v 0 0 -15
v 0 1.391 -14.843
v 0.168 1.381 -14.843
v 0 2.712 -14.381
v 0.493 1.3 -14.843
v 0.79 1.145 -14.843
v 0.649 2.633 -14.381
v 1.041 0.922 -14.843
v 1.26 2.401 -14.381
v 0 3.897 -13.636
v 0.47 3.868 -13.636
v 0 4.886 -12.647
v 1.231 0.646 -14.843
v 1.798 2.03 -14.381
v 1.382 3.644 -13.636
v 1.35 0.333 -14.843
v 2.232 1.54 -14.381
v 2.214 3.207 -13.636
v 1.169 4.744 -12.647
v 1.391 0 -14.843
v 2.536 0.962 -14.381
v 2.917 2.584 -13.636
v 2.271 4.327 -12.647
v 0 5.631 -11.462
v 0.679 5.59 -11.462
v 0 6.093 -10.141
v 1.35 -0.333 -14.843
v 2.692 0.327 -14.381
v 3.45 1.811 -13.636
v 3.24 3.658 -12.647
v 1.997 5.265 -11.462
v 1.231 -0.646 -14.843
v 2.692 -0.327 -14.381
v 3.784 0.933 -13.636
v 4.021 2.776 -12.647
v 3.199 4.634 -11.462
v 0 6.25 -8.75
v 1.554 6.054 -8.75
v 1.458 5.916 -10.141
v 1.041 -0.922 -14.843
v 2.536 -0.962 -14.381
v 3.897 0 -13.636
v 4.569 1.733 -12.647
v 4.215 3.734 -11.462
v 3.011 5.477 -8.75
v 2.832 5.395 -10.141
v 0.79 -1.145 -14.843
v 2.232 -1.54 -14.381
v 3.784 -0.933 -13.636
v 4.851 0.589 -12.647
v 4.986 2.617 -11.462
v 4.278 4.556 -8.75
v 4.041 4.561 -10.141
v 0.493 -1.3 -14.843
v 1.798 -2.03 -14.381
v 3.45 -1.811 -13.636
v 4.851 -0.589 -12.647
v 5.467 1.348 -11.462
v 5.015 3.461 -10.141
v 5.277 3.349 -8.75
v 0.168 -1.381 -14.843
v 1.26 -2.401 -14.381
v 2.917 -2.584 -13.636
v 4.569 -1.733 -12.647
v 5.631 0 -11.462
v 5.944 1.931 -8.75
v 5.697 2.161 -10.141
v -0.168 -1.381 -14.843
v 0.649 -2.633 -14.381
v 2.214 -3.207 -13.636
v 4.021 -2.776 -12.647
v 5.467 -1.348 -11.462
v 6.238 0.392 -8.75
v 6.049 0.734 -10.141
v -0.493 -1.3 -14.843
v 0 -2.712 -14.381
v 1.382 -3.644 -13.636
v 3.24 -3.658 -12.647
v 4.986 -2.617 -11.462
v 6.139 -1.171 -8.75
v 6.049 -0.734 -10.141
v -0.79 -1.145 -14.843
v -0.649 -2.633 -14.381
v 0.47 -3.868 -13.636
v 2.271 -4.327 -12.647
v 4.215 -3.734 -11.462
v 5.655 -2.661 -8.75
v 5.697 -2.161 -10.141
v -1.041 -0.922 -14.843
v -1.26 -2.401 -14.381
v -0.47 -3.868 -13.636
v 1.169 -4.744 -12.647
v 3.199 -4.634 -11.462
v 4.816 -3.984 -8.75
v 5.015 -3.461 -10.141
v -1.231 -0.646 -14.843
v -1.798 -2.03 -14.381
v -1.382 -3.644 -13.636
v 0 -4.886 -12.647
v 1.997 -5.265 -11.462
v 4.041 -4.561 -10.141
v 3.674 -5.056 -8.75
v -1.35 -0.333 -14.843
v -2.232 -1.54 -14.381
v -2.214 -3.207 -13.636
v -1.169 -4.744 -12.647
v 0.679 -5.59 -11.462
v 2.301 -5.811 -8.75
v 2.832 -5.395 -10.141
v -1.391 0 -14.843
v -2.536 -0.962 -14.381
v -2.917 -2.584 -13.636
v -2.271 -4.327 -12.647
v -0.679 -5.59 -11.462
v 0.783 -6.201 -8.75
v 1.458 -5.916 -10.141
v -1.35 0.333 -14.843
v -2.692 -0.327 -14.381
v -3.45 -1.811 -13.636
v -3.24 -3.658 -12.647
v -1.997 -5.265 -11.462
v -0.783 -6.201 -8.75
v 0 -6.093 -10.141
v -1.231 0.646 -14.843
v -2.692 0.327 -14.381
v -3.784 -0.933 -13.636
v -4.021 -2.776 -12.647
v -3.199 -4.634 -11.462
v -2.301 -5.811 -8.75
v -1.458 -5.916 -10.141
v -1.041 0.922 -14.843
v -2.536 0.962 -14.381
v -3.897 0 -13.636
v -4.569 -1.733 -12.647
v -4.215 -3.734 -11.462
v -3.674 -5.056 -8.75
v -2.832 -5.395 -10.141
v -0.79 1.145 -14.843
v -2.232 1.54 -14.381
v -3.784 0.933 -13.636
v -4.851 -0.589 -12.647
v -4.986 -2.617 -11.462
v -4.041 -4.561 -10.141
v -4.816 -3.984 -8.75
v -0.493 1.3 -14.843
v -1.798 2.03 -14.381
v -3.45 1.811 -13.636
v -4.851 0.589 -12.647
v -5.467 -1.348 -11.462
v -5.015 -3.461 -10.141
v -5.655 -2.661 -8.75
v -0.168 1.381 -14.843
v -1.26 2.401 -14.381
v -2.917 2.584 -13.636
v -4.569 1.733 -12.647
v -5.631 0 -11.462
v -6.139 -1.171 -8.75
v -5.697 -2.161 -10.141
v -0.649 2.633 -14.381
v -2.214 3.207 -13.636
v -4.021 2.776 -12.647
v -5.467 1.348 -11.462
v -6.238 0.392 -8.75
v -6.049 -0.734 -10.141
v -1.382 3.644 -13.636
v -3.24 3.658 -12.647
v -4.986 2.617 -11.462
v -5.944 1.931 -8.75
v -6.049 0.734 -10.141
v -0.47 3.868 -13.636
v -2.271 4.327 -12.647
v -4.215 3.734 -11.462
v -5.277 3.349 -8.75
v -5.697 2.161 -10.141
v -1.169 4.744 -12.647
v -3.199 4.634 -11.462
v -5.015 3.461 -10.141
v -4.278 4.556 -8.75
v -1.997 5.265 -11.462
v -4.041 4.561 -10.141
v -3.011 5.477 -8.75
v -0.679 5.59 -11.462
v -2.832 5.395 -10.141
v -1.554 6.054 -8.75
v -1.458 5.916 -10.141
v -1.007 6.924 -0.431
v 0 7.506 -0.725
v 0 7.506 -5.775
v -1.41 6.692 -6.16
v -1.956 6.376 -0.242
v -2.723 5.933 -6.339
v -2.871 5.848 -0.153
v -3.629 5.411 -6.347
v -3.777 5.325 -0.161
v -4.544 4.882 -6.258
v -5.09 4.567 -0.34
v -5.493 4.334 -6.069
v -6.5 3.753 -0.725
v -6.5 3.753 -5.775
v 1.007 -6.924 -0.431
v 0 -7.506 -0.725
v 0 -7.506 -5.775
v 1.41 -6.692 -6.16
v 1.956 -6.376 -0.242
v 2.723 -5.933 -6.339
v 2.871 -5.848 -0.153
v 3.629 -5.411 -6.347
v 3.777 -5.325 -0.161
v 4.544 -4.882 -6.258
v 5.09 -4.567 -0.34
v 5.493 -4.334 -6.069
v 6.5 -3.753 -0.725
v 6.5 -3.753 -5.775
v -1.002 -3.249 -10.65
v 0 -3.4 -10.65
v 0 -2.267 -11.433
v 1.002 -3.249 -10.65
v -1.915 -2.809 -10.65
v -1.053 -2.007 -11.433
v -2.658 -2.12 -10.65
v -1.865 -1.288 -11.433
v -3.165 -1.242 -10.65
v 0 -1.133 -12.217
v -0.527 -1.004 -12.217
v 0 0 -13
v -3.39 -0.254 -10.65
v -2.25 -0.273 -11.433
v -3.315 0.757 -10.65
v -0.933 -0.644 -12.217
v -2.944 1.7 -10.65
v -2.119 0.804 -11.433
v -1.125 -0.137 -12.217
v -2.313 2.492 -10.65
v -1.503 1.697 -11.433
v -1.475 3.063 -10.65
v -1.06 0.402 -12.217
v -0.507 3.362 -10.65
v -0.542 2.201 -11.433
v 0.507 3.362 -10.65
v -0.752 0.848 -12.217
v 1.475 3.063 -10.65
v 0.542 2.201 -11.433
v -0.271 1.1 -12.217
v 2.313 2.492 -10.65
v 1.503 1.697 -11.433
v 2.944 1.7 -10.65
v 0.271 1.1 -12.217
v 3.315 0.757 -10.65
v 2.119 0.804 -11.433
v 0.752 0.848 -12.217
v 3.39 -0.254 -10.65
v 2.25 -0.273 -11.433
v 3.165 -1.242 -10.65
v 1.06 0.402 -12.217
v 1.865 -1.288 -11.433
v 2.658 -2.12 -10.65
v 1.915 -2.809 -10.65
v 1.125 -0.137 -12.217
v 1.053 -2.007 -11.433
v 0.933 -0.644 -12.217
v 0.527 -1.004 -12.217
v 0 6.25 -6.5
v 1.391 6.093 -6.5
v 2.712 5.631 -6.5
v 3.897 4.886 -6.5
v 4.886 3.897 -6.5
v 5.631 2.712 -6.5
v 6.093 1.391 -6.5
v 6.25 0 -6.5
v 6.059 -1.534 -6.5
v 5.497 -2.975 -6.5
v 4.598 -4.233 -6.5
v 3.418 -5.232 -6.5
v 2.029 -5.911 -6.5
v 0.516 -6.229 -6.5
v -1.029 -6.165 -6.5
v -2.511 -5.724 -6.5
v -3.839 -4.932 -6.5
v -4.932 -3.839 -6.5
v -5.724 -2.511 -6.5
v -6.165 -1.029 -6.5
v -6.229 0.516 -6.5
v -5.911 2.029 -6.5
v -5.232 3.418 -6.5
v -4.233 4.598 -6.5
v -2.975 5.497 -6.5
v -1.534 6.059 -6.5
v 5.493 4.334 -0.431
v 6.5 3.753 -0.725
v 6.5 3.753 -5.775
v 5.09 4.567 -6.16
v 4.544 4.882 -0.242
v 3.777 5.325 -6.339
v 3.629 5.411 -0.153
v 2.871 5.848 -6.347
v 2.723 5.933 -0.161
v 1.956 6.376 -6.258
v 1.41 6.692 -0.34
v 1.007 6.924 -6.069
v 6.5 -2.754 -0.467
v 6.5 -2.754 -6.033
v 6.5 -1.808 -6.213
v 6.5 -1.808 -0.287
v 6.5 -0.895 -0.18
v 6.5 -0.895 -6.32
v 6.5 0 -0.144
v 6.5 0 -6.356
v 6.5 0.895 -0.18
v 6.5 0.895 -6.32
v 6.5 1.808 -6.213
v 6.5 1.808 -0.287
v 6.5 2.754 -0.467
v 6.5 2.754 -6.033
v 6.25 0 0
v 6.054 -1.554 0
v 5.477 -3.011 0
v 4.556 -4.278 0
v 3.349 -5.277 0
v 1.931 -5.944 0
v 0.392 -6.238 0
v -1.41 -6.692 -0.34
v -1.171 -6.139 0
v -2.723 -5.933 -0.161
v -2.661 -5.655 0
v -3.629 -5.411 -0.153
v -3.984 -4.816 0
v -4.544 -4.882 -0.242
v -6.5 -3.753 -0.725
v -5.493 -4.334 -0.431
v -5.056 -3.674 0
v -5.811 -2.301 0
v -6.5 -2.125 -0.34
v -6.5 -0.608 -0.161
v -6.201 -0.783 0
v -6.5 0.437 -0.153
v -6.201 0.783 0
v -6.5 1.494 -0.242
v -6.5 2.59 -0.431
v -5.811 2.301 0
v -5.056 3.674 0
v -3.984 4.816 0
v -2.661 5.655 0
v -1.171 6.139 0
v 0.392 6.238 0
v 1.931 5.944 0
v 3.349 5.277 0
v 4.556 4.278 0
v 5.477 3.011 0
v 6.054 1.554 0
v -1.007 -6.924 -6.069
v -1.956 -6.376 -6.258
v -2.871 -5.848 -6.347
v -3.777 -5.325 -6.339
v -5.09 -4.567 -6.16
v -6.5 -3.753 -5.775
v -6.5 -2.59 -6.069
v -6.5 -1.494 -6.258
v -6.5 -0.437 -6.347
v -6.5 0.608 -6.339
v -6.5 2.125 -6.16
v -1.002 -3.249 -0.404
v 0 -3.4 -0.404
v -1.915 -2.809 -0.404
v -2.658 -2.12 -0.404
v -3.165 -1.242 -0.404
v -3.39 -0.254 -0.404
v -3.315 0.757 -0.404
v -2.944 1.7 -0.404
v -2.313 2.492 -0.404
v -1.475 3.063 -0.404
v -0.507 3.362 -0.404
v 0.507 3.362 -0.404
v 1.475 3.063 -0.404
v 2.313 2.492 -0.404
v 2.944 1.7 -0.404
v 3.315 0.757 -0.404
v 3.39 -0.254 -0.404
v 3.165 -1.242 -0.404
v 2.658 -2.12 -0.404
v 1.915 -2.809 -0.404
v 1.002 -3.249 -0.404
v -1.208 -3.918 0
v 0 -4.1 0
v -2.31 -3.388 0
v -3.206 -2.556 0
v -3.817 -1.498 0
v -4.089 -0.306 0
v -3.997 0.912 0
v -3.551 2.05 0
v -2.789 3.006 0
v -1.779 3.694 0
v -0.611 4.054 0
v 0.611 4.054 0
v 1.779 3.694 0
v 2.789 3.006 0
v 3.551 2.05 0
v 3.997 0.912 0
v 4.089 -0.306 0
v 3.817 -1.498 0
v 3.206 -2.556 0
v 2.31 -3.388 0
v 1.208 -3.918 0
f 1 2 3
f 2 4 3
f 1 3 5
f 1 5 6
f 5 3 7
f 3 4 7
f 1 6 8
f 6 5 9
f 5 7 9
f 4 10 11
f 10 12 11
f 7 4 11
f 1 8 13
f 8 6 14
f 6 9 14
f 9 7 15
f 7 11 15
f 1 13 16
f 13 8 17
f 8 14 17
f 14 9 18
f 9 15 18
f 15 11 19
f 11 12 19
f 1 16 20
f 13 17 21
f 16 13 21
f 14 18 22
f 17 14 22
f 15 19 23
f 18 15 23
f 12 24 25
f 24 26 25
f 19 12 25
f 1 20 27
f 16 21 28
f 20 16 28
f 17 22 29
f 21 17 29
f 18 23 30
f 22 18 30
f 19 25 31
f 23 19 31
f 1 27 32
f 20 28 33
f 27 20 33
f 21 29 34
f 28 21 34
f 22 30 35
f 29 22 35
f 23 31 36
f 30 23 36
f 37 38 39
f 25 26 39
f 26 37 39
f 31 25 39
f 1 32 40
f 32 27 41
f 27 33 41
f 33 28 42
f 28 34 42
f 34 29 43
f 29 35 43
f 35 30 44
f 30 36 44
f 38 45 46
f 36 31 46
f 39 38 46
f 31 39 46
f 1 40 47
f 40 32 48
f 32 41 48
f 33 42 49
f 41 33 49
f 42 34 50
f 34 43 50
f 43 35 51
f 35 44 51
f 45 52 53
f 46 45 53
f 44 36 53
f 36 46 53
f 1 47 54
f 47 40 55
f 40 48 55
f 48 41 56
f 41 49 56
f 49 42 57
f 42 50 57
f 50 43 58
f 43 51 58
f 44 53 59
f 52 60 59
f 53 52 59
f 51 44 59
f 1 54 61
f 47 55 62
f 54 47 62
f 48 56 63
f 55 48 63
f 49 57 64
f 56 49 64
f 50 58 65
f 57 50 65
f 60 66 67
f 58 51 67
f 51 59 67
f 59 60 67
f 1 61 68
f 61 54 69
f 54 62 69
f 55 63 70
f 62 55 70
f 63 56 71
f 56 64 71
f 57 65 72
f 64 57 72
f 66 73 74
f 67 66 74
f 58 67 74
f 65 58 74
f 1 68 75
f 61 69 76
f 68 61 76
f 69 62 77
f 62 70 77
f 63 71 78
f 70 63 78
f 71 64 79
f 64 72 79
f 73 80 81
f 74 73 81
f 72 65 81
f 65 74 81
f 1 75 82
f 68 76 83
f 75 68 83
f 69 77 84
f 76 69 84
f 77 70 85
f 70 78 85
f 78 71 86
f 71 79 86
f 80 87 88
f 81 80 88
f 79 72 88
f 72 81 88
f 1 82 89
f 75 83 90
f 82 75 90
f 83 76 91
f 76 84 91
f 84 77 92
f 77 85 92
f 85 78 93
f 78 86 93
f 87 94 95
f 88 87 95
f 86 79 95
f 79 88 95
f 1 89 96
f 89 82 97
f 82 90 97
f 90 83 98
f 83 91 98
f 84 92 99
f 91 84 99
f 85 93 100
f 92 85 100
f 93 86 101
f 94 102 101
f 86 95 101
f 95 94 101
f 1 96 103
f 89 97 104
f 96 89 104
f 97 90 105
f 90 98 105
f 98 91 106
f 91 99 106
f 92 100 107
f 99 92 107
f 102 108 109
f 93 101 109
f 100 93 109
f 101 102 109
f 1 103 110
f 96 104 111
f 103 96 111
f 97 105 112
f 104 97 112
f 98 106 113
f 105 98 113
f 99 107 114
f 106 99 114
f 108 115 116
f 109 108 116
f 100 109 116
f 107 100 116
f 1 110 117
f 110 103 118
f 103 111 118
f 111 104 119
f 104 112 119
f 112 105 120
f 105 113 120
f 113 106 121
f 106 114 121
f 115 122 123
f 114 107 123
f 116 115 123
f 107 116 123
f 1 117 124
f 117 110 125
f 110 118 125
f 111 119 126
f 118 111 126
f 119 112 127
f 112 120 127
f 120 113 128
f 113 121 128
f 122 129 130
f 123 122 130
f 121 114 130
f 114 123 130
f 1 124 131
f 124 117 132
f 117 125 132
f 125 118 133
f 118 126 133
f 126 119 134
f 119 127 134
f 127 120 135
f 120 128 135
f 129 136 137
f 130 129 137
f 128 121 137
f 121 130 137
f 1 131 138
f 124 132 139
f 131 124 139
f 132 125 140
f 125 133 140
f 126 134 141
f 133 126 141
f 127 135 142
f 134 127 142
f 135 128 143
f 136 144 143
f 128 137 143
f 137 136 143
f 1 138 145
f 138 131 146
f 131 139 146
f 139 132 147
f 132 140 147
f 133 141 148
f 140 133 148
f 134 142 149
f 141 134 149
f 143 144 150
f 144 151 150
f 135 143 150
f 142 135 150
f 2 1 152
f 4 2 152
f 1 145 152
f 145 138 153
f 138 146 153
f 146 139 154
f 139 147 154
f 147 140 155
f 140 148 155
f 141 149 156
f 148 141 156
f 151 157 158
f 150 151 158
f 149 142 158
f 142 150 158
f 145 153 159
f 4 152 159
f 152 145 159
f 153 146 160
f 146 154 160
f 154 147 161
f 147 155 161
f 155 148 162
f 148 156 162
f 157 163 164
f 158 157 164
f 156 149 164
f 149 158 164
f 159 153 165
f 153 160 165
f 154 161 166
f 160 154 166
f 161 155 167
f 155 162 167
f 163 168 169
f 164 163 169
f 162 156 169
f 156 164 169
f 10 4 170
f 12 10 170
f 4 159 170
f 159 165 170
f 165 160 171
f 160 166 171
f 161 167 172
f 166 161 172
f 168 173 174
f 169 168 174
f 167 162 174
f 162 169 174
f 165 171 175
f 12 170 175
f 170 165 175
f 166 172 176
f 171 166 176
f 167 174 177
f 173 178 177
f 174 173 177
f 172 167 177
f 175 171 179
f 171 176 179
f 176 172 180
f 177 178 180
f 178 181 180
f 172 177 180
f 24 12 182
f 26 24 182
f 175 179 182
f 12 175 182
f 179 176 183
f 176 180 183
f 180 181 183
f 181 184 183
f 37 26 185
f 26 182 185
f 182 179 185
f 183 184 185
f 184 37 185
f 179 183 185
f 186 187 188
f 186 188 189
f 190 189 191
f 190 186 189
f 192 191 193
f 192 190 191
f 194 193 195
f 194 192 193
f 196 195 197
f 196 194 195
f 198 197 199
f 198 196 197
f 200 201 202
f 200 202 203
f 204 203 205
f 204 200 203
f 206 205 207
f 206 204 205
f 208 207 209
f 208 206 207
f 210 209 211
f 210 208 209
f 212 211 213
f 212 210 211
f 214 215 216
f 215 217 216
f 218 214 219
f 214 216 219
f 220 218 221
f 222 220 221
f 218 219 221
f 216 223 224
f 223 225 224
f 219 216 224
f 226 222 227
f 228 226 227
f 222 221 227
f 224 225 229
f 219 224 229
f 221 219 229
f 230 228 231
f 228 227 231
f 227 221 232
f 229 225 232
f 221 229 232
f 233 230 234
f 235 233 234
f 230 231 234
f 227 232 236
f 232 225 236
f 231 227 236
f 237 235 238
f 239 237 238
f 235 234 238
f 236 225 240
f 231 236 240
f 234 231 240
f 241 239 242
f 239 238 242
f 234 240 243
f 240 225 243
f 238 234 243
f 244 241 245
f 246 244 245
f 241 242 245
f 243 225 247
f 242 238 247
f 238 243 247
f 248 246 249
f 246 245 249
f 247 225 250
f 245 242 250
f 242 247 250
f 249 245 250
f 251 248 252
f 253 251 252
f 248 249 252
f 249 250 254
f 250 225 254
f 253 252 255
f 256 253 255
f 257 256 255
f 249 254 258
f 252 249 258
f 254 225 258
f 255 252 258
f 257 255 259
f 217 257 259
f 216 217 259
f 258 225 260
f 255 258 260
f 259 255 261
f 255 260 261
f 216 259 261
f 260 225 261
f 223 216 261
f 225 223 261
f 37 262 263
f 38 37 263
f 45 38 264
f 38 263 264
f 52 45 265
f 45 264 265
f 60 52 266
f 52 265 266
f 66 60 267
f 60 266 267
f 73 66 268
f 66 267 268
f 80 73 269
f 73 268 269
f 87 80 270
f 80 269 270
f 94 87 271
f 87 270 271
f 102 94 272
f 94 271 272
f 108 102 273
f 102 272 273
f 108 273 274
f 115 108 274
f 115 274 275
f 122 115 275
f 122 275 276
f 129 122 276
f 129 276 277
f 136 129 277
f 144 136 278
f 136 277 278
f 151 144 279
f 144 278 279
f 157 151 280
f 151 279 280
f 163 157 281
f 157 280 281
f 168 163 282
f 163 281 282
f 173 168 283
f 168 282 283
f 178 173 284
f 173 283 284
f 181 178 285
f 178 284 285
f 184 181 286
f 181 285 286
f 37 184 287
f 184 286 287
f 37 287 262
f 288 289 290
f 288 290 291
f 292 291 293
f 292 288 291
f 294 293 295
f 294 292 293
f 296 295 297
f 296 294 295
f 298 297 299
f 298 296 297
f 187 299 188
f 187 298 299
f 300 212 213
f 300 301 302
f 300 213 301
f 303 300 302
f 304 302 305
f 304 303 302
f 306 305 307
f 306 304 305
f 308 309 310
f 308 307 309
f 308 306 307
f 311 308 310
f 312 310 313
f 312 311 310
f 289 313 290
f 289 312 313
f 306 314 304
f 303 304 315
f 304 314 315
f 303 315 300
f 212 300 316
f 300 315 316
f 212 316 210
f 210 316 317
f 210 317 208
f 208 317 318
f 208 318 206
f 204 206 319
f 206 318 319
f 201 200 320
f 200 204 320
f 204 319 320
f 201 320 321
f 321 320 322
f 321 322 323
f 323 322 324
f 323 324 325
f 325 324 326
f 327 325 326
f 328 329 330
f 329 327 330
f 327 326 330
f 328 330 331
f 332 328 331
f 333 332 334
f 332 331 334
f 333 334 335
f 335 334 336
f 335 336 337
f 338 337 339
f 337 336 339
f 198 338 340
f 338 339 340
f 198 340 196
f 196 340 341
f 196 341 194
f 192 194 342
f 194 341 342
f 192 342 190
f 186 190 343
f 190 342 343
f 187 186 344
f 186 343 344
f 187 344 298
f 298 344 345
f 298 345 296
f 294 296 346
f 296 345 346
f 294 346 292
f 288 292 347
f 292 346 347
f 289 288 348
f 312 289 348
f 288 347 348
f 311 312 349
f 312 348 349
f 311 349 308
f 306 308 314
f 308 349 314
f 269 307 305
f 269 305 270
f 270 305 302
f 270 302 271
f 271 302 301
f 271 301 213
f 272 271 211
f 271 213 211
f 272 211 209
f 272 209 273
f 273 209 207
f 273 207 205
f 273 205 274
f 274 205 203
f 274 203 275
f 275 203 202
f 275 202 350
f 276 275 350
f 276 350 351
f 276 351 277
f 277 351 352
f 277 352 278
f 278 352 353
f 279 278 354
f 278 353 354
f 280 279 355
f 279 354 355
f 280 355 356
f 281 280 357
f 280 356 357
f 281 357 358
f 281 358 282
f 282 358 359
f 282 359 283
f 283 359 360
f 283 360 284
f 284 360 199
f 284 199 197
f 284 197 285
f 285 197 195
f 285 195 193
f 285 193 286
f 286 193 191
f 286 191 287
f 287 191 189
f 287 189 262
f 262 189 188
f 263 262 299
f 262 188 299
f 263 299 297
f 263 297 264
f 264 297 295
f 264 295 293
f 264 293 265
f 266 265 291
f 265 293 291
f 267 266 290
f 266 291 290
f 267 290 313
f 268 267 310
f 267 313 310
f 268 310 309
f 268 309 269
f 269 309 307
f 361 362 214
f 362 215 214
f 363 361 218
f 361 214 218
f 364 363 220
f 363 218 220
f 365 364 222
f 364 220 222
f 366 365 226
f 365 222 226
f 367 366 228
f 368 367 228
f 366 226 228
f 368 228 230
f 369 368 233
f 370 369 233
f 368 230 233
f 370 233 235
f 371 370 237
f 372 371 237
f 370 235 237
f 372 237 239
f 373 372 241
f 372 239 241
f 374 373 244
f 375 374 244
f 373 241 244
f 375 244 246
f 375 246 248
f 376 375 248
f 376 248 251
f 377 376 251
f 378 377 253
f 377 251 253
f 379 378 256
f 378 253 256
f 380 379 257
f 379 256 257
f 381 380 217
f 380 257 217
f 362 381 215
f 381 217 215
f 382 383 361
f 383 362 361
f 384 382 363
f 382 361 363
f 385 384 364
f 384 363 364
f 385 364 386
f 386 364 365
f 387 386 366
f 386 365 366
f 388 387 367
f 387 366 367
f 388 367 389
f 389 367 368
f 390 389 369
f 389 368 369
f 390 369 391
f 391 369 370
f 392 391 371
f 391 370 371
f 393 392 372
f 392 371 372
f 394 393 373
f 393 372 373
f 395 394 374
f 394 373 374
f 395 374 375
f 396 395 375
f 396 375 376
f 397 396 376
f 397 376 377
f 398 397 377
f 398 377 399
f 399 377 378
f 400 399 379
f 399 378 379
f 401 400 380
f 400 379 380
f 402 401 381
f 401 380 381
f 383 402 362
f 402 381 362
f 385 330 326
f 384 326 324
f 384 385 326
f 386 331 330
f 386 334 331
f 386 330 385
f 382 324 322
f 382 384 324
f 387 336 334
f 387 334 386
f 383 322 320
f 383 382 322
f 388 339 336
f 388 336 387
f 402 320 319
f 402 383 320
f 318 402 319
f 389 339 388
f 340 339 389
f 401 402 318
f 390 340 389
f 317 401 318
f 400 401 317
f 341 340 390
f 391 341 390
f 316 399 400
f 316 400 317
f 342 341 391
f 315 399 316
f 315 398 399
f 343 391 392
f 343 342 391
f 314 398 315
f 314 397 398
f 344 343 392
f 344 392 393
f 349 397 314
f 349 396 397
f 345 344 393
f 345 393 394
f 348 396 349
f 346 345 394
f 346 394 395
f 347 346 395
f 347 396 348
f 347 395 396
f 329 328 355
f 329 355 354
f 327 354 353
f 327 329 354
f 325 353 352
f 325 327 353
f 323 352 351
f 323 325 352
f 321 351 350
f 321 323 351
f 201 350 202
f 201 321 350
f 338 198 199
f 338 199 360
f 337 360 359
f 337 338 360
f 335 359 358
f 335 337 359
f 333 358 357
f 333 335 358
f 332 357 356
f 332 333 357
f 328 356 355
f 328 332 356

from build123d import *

# Parameters (mm, degrees)
BOSS_EXTRUDE1_DEPTH = 15


with BuildPart() as part:
    # Sketch1 → Boss-Extrude1 (new body)
    with BuildSketch(Plane.XY):
        Polygon((0, 7.505553499), (-6.5, 3.75277675), (-6.5, -3.75277675), (0, -7.505553499), (6.5, -3.75277675), (6.5, 3.75277675), align=None)
    extrude(amount=-BOSS_EXTRUDE1_DEPTH)

    # Sketch2 → Cut-Revolve7 (revolve, cut)
    with BuildSketch(Plane(origin=(0, 0, 0), x_dir=(0, 0, -1), z_dir=(1, 0, 0))):
        with BuildLine():
            Line((16, 0), (15, 0))
            ThreePointArc((15, 0), (13.169417382, 4.419417382), (8.75, 6.25))
            Line((8.75, 6.25), (6.5, 6.25))
            Line((6.5, 6.25), (6.5, 30.553605498))
            Line((6.5, 30.553605498), (16, 30.553605498))
            Line((16, 30.553605498), (16, 0))
        make_face()
    revolve(axis=Axis((0, 0, 0), (0, 0, -1)), mode=Mode.SUBTRACT)

    # Sketch3 → Cut-Revolve8 (revolve, cut)
    with BuildSketch(Plane(origin=(0, 0, 0), x_dir=(0, 0, -1), z_dir=(1, 0, 0)), mode=Mode.PRIVATE) as cut_revolve8_sk:
        Polygon((5.775105849, 7.505553499), (6.5, 7.505553499), (6.5, 6.25), align=None)
        Polygon((0, 6.25), (0, 7.505553499), (0.724894151, 7.505553499), align=None)
    revolve(cut_revolve8_sk.sketch.rotate(Axis((0, 0, 0), (0, 0, -1)), 90), axis=Axis((0, 0, 0), (0, 0, -1)), mode=Mode.SUBTRACT)

    # Sketch4 → Cut-Revolve9 (revolve, cut)
    with BuildSketch(Plane(origin=(0, 0, 0), x_dir=(0, 0, -1), z_dir=(1, 0, 0)), mode=Mode.PRIVATE) as cut_revolve9_sk:
        Polygon((0, 4.1), (0.404145188, 3.4), (10.65, 3.4), (13, 0), (0, 0), align=None)
    revolve(cut_revolve9_sk.sketch.rotate(Axis((0, 0, 0), (0, 0, -1)), 180), axis=Axis((0, 0, 0), (0, 0, -1)), mode=Mode.SUBTRACT)


solid = part.part
